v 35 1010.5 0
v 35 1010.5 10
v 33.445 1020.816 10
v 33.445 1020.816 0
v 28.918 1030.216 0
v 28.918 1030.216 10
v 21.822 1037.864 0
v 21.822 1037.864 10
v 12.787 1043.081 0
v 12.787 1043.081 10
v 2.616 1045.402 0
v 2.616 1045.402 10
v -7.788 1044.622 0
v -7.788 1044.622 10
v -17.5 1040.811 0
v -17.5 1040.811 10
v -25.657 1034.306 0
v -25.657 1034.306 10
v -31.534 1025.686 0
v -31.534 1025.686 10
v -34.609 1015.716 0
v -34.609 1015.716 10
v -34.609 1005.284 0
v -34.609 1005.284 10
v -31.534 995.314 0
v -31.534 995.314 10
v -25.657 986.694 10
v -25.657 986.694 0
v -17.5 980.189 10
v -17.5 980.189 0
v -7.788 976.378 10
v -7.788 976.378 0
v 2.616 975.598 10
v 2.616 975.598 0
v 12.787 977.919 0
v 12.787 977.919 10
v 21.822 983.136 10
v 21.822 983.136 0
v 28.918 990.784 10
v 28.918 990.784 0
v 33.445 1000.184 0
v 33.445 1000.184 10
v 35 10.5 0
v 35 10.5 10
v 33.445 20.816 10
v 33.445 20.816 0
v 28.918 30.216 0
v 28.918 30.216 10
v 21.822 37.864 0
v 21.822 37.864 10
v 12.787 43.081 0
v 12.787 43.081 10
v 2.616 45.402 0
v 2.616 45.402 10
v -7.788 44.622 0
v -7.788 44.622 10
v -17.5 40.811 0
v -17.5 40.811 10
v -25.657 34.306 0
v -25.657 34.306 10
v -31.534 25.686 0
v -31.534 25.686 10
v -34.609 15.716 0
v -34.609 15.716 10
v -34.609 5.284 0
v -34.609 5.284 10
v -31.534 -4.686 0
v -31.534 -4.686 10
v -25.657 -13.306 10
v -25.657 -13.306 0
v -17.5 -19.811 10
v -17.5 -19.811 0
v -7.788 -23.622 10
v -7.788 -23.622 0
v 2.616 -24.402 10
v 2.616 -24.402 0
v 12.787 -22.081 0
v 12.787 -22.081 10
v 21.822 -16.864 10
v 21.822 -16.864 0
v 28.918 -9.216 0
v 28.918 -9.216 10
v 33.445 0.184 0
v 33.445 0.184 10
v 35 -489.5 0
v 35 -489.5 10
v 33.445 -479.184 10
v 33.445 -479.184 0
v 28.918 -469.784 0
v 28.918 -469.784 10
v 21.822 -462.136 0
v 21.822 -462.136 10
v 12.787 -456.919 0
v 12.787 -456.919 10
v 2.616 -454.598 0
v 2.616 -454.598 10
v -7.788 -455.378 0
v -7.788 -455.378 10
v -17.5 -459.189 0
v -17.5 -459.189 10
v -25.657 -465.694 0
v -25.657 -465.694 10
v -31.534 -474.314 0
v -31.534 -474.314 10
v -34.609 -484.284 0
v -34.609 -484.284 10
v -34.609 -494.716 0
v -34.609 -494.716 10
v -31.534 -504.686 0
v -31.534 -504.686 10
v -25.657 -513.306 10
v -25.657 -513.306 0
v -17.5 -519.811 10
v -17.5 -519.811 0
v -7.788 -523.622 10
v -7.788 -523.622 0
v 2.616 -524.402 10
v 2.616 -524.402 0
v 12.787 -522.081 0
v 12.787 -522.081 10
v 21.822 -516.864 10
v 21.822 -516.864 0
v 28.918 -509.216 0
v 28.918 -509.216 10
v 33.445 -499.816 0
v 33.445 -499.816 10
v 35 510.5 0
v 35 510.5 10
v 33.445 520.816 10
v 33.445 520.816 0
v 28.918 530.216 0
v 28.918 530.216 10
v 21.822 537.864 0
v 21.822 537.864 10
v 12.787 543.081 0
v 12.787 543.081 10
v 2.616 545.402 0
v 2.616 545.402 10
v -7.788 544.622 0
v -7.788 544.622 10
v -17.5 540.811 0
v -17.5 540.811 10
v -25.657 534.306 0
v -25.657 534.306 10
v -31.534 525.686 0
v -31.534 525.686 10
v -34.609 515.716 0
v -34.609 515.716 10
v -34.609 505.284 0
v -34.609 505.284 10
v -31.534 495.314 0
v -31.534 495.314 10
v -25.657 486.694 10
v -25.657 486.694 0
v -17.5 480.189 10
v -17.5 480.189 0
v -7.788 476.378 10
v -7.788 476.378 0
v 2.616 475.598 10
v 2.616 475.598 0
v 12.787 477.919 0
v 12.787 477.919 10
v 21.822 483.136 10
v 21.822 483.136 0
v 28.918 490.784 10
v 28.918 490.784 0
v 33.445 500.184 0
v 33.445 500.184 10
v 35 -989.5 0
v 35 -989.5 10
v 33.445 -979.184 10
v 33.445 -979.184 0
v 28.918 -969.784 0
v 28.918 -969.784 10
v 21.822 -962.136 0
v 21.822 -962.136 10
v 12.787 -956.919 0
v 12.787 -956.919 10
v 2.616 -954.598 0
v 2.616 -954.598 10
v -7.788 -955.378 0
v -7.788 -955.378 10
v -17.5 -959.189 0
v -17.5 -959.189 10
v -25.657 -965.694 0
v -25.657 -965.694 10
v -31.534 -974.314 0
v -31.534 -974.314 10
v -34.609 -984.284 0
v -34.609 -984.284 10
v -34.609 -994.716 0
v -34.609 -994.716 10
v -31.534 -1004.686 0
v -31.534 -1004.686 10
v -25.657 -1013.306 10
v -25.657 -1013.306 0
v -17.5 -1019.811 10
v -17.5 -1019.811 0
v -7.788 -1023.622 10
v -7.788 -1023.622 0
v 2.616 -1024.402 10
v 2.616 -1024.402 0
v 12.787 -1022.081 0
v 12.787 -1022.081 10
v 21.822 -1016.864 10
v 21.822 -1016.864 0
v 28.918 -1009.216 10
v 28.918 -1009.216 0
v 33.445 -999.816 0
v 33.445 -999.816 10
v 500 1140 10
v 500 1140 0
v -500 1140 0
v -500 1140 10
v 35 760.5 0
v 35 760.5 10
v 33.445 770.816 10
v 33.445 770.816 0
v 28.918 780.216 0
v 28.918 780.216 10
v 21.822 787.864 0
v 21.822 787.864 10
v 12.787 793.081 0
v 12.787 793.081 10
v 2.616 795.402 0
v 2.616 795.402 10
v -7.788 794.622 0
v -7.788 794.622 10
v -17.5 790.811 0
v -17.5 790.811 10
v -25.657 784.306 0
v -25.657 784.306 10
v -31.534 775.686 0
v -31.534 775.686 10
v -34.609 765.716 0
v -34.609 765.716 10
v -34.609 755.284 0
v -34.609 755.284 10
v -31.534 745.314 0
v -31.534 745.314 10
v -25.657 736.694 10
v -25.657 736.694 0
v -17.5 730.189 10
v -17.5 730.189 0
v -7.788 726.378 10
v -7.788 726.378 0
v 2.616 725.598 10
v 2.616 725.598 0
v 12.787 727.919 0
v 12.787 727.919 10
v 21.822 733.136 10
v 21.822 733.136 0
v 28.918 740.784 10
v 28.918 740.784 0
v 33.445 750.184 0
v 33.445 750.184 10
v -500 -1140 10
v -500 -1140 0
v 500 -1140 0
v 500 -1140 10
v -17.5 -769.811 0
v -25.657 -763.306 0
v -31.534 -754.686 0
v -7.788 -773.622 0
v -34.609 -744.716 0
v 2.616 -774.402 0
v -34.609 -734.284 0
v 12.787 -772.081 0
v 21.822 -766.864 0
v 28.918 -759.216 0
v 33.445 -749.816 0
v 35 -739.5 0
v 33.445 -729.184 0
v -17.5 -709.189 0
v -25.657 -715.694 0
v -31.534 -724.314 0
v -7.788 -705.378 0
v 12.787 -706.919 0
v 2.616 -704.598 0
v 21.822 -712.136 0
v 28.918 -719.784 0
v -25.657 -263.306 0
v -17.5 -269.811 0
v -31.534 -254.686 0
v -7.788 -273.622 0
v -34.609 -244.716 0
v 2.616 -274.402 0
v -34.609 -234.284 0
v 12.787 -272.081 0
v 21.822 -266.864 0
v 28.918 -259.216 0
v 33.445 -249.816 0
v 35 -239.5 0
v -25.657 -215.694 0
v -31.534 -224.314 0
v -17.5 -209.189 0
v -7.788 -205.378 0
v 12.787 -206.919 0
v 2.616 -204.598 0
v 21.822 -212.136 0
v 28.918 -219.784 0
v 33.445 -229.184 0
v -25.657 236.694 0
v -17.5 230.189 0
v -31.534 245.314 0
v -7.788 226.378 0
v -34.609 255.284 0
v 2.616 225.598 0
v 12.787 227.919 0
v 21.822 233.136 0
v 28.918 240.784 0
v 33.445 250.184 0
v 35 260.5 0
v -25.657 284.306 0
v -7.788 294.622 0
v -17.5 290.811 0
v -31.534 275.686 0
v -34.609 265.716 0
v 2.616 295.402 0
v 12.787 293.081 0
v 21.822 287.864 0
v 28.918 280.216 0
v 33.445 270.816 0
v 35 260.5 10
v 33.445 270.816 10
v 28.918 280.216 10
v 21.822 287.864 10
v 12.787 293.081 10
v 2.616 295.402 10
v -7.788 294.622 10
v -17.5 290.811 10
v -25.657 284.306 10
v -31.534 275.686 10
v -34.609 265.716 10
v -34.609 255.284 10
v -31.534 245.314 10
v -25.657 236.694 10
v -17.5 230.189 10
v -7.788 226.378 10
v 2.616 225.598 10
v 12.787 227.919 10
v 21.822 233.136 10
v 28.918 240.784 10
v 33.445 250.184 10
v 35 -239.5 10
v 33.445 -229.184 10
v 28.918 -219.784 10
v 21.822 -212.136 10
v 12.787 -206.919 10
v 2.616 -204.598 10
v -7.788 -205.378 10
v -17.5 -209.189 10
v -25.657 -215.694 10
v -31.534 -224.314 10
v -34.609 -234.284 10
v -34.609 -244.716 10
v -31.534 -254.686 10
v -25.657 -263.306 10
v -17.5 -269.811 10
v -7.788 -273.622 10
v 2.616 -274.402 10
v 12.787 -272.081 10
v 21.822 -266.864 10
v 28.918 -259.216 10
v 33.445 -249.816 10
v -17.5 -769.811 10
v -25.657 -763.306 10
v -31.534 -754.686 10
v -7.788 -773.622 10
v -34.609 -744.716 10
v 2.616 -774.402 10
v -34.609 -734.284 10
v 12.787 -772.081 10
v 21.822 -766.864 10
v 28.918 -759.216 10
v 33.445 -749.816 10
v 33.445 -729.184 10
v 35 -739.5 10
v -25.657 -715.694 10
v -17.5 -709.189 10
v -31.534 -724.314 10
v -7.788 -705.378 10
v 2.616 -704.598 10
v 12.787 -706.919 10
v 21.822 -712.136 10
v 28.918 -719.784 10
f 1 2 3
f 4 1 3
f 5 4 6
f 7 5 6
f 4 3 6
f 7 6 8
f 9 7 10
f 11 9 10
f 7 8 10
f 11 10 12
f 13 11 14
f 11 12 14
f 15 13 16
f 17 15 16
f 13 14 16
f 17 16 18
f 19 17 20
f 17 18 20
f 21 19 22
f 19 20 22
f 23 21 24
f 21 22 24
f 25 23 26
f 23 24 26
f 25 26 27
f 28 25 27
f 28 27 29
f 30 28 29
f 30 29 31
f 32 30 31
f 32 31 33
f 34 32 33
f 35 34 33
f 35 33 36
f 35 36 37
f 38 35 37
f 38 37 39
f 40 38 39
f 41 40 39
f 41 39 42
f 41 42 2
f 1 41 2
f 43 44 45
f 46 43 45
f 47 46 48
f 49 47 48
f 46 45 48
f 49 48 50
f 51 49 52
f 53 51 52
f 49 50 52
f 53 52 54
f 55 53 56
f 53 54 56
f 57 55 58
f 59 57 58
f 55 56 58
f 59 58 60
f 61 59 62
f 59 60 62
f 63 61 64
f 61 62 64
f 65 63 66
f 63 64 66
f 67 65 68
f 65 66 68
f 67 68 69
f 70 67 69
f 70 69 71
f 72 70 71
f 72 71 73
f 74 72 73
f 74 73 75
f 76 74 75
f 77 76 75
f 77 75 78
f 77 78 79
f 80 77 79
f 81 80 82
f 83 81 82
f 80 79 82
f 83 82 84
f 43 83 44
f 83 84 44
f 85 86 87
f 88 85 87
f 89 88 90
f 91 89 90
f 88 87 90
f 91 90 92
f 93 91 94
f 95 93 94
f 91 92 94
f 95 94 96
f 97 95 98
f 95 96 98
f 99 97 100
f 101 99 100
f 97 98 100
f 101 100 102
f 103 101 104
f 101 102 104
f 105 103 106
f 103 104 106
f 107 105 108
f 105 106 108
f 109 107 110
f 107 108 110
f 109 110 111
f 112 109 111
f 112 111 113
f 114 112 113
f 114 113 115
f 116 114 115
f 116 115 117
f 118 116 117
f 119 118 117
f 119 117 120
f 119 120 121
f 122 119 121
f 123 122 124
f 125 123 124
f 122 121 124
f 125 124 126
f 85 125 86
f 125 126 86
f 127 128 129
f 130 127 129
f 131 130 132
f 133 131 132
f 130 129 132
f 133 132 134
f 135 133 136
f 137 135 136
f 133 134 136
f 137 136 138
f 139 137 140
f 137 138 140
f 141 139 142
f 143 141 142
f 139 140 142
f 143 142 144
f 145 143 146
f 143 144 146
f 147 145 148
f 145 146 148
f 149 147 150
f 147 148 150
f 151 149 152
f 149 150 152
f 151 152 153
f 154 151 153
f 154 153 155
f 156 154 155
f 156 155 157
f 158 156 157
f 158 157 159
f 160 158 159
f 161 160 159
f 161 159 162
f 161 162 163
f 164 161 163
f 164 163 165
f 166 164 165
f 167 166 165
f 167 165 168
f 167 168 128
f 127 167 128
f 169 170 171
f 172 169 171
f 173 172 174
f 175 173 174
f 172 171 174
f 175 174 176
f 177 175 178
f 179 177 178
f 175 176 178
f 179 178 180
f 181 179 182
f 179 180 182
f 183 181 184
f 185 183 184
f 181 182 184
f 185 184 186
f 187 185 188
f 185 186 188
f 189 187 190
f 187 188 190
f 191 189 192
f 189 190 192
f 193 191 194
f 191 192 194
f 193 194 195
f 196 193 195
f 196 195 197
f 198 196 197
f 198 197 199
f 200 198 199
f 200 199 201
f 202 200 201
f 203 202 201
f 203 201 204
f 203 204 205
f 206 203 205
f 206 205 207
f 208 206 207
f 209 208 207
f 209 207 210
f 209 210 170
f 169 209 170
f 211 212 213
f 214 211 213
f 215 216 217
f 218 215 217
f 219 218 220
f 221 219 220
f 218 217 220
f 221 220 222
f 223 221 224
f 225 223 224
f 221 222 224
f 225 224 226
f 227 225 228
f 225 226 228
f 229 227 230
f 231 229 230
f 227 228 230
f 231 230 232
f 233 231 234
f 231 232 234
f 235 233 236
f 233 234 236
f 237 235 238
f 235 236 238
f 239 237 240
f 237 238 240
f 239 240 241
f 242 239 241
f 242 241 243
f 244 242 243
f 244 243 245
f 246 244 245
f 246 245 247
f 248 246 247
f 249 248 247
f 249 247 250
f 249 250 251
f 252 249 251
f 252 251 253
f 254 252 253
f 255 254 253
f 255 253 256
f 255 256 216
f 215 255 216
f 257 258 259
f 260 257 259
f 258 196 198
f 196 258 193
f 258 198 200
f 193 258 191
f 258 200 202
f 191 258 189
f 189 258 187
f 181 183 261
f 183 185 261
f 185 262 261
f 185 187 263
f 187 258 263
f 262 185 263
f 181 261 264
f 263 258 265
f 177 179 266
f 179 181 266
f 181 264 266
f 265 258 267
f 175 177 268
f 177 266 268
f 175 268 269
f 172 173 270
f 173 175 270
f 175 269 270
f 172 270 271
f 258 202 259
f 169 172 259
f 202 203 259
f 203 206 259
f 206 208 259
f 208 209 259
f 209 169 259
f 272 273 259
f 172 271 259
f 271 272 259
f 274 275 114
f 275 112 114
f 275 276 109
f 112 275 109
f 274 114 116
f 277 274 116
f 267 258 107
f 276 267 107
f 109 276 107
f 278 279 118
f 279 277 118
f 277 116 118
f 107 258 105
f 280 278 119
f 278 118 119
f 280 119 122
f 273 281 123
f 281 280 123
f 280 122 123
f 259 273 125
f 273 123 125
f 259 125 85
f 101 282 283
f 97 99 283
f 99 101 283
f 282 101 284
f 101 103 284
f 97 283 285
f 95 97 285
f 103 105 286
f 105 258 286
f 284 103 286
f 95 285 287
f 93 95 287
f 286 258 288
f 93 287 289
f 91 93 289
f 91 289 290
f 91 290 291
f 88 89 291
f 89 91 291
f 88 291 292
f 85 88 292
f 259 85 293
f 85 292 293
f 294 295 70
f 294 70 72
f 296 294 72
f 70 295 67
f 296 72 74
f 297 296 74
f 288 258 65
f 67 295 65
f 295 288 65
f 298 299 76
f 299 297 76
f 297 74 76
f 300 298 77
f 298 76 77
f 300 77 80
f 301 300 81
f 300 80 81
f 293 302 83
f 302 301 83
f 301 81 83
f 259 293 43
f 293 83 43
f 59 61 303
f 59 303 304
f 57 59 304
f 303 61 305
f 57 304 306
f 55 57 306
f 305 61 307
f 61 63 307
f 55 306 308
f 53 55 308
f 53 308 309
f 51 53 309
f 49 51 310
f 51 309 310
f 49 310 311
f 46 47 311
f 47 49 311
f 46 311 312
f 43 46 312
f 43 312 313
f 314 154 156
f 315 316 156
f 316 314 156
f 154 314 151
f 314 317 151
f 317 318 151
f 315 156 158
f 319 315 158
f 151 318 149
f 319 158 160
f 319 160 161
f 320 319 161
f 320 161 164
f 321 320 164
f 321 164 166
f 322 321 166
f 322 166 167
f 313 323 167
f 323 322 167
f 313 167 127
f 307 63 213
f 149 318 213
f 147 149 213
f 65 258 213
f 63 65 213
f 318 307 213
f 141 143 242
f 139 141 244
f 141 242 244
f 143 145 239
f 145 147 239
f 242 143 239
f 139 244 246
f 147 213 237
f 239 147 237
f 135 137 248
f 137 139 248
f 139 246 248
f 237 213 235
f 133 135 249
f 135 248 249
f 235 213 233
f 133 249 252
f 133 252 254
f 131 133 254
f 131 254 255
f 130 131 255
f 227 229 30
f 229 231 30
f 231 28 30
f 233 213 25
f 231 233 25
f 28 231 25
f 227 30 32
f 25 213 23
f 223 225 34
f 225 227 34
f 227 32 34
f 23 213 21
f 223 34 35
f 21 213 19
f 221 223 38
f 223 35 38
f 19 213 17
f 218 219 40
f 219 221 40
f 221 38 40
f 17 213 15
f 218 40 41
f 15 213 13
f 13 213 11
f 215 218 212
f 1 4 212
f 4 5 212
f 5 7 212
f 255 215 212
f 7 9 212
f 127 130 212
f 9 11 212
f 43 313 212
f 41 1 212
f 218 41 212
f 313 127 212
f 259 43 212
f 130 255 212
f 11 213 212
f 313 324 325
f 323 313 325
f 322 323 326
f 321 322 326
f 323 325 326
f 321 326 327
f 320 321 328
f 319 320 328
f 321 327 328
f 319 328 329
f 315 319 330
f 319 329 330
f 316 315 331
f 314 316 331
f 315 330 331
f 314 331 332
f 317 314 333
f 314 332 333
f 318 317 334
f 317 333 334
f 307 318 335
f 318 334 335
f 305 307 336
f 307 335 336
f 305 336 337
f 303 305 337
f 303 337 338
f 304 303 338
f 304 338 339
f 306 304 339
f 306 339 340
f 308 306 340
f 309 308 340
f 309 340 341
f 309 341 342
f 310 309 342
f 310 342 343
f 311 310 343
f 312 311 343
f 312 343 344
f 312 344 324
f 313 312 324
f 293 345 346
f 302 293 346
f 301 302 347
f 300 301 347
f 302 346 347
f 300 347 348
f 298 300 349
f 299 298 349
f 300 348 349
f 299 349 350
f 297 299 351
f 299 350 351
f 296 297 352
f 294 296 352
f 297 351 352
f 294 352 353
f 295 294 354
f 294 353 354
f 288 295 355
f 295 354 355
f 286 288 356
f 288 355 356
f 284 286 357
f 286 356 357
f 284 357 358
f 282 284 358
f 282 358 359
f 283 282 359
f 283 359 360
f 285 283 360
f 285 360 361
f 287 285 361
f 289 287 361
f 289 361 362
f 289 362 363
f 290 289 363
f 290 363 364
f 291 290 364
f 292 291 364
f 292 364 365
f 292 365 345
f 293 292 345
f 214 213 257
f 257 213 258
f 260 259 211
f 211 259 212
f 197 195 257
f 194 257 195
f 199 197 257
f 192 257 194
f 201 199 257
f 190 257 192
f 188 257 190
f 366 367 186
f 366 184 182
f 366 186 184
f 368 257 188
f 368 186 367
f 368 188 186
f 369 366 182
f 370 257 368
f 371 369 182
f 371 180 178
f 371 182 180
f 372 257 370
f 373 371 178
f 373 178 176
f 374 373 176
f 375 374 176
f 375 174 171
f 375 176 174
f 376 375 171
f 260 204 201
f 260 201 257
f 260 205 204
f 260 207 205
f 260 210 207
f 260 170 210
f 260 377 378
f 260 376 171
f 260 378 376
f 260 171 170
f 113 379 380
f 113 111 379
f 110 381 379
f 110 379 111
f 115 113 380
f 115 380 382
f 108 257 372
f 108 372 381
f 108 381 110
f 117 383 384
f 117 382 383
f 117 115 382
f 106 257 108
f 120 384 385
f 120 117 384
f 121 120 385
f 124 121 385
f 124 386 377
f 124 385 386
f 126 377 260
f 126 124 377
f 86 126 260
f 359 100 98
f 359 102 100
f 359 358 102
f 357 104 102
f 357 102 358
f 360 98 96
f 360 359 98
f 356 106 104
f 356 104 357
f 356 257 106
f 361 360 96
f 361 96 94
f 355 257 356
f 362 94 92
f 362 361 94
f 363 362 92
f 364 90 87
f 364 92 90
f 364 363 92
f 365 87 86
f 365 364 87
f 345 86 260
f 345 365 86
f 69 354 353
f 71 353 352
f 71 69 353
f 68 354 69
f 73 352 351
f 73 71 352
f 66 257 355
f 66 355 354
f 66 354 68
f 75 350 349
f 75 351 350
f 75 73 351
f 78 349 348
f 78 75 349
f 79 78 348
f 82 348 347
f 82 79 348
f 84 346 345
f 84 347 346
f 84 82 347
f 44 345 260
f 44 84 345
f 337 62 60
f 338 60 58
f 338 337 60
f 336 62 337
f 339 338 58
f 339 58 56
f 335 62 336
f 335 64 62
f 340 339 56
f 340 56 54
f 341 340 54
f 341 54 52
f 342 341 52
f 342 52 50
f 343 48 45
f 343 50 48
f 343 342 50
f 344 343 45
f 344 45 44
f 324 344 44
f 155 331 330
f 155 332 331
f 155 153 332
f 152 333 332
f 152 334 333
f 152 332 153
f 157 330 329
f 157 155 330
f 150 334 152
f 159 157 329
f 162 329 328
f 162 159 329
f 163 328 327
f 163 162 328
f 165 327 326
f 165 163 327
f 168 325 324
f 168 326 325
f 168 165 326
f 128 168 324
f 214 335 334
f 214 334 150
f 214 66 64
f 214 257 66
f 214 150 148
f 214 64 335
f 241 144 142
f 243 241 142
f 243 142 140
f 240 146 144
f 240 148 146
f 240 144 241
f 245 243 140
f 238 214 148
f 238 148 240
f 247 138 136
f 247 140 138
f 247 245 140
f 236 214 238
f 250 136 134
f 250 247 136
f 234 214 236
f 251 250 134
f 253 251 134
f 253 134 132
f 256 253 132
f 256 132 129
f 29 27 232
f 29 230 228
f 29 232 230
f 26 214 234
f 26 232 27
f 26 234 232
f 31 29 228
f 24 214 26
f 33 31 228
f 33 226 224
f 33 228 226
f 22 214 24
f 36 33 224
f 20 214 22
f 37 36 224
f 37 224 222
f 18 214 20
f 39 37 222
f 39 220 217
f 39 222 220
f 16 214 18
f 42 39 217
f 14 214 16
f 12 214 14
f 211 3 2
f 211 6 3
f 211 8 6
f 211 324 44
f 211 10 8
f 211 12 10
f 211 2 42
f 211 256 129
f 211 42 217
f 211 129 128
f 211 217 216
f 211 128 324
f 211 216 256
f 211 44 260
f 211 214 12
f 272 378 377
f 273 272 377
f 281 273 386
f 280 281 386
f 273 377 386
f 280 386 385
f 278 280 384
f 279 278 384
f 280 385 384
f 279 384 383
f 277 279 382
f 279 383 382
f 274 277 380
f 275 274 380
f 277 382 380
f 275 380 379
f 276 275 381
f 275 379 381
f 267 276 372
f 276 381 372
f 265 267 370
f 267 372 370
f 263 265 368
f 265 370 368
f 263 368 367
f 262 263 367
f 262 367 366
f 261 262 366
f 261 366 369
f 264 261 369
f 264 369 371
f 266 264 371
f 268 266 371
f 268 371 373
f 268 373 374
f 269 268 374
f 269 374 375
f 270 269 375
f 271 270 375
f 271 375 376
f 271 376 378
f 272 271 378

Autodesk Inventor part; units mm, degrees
ref_plane "YZ Plane" through (0, 0, 0) normal (1, 0, 0) x (0, 1, 0)
ref_plane "XZ Plane" through (0, 0, 0) normal (0, 1, 0) x (-1, 0, 0)
ref_plane "XY Plane" through (0, 0, 0) normal (0, 0, 1) x (1, 0, 0)
sketch "Sketch1" plane through (0, 0, 0) normal (0, 0, 1) x (1, 0, 0)
  line L0 (-500, -1140) -> (500, -1140)
  line L1 (500, -1140) -> (500, 1140)
  line L2 (500, 1140) -> (-500, 1140)
  line L3 (-500, 1140) -> (-500, -1140)
  line L4 (-500, -1140) -> (500, 1140) construction
  line L5 (500, -1140) -> (-500, 1140) construction
  point P0 (0, 0)
  dimension "d0" = 1000
  dimension "d1" = 2280
extrude "Plate1" add sketch "Sketch1" along normal blind 10
sketch "Sketch2" plane through (0, 0, 10) normal (0, 0, 1) x (1, 0, 0)
  line L0 (500, -1140) -> (-500, -1140) projected
  line L1 (500, 1140) -> (500, -1140) projected
  line L2 (-500, 1140) -> (500, 1140) projected
  line L3 (-500, -1140) -> (-500, 1140) projected
  circle A0 centre (0, -989.5) radius 35
  point P0 (0, 0)
  point P1 (0, -1140)
  dimension "d3" = 70
  dimension "d4" = 150.5
extrude "Extrusion1" cut sketch "Sketch2" against normal through all contours A0
pattern_linear "Rectangular Pattern1" count 9 spacing 250 along (0, 1, 0) of "Extrusion1"
equation "\"d2\" = Thickness"
equation "\"BendReliefDepth\" = 0.5 * Thickness"
equation "\"Thickness\" = 10"
properties part number "ДМФ 067 крышка"
